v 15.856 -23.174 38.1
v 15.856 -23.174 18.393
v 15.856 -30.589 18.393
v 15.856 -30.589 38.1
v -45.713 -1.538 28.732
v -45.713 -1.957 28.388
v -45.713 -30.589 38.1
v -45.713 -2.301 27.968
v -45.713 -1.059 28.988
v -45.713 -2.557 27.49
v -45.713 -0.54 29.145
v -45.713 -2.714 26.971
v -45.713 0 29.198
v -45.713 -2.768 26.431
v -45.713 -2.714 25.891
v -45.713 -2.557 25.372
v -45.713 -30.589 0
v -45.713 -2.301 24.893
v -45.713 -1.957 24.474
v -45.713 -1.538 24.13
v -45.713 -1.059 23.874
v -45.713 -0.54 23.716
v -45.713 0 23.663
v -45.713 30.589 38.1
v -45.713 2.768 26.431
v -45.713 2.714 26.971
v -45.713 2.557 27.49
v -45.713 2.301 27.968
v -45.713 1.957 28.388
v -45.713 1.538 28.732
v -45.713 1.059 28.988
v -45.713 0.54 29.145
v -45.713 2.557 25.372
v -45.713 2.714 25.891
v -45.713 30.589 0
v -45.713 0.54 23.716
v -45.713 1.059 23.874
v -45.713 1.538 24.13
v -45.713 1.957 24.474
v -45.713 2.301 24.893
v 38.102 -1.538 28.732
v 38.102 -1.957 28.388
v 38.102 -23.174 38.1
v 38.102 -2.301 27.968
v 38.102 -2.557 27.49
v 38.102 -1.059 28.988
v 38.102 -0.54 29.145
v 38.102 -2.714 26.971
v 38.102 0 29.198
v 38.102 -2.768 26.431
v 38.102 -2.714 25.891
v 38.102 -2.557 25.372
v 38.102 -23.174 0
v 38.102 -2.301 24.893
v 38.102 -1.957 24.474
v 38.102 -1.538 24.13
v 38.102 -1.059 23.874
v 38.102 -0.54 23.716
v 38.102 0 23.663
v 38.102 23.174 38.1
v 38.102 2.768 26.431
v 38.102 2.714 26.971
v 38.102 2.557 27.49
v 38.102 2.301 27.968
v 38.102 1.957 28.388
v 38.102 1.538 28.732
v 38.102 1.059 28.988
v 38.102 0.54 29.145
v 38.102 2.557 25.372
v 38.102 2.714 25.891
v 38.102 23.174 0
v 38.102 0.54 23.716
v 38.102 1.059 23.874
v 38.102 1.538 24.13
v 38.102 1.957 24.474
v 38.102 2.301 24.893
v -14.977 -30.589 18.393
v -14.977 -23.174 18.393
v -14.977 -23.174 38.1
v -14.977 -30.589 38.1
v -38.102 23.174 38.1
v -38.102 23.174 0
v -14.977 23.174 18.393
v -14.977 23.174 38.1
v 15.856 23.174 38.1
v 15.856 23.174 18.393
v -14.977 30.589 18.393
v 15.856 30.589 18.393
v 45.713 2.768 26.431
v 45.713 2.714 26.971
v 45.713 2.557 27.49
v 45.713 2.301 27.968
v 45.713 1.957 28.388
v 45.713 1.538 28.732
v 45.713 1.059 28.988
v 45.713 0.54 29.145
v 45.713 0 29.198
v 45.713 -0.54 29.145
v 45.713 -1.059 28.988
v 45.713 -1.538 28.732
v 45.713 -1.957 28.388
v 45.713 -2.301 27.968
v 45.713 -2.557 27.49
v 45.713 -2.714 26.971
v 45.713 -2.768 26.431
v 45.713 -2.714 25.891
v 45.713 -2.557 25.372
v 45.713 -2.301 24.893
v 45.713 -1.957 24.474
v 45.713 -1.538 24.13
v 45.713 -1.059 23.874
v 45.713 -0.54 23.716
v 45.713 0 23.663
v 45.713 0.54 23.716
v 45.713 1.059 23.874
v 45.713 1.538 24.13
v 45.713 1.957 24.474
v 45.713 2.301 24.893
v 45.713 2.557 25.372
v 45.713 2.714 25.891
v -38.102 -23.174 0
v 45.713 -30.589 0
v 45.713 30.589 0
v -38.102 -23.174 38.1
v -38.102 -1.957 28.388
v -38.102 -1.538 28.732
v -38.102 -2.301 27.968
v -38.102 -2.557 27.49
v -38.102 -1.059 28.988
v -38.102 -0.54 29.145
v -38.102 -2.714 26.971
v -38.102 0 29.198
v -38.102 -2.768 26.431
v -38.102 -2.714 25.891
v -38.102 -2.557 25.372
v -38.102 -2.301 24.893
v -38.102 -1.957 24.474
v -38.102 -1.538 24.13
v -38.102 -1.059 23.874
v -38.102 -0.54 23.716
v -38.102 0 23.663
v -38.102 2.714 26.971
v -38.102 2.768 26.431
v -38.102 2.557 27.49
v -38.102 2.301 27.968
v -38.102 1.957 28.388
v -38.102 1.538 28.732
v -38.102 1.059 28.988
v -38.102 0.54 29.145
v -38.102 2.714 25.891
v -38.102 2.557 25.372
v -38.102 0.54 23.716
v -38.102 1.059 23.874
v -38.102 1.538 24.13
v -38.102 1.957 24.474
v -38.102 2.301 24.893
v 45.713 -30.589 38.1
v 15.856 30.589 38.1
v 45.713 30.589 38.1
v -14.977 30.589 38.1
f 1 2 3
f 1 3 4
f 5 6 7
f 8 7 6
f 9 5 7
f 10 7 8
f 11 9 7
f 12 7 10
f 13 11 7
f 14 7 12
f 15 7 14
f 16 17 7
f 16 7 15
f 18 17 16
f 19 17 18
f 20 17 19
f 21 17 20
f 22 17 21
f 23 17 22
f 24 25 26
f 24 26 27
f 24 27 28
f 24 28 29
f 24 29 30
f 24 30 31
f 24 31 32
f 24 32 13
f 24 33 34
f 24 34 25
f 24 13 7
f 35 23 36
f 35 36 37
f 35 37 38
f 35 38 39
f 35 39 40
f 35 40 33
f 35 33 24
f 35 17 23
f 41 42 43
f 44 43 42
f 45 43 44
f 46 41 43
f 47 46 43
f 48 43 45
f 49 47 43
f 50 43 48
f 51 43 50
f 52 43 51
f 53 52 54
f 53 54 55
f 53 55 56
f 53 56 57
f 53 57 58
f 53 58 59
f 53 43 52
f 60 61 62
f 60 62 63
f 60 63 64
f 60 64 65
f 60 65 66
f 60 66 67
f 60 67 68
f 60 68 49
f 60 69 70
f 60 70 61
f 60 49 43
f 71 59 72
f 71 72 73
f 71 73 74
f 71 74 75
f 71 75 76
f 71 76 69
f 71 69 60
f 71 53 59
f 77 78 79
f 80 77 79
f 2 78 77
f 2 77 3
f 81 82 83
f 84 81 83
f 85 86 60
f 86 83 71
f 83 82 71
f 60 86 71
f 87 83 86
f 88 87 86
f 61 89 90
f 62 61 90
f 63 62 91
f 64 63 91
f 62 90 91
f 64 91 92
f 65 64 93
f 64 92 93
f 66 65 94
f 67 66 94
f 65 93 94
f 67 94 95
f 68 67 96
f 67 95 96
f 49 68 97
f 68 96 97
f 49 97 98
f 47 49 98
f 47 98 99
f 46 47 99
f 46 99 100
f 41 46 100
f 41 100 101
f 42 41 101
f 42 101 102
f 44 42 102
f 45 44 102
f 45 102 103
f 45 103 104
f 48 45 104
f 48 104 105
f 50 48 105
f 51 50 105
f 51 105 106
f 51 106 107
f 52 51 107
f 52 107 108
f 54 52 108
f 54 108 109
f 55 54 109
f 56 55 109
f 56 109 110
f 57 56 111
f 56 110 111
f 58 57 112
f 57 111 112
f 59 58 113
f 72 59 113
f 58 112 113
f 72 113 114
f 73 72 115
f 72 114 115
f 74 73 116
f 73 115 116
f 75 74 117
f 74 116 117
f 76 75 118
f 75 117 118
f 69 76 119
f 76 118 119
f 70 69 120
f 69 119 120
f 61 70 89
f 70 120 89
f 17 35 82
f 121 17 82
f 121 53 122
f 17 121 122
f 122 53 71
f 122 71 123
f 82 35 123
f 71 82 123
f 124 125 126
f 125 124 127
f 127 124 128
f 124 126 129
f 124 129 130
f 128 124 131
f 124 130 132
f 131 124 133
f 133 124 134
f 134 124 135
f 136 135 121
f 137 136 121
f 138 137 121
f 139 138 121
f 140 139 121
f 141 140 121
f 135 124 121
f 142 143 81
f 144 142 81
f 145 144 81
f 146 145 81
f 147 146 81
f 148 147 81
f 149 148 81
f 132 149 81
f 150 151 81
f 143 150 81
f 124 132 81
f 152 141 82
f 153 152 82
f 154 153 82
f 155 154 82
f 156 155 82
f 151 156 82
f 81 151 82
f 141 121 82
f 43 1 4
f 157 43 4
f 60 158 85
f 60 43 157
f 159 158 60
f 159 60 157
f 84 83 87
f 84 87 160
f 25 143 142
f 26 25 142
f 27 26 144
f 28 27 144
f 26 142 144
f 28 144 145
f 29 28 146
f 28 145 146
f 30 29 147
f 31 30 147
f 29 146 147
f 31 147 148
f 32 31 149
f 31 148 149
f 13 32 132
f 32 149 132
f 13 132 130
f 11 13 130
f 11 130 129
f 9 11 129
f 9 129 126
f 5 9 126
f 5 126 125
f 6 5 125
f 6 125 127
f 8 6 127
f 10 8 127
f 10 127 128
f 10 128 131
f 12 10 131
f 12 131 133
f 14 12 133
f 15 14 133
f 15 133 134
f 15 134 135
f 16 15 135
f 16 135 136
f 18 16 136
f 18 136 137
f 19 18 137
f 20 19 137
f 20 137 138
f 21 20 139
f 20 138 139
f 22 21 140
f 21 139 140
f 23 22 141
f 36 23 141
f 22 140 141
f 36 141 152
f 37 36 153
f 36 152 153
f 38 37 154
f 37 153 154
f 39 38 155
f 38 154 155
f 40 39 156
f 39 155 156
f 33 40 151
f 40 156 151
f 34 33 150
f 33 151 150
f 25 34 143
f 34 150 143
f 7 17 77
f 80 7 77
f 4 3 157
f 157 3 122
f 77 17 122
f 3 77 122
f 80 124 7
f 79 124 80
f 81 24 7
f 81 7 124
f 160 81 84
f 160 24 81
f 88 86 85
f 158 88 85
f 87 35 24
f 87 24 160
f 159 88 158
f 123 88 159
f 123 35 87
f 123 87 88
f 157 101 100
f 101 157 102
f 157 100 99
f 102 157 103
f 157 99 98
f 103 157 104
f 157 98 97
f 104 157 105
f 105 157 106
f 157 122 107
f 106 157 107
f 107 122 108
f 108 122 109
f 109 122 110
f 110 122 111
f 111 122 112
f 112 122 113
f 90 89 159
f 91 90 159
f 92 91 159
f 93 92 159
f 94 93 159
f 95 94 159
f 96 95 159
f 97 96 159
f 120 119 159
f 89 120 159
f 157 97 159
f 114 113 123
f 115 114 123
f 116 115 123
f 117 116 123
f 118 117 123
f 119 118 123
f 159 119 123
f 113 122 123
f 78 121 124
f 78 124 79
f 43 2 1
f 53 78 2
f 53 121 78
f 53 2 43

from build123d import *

# Parameters (mm, degrees)
F0_W     = 91.42606
F0_H     = 61.178378
F0_W_2   = 76.204642
F0_H_2   = 46.347256
F1_DEPTH = 38.1
F2_W     = 30.83312
F2_H     = 20.100074
F3_DEPTH = 62.738
F4_DEPTH = 41.91
F5_R     = 2.767674
F6_DEPTH = 103.632


with BuildPart() as f1:
    # F0 (on Top) → F1 (new body)
    with BuildSketch(Plane.XY):
        Rectangle(F0_W, F0_H)
        Rectangle(F0_W_2, F0_H_2, mode=Mode.SUBTRACT)
    extrude(amount=F1_DEPTH)

    # F2 (on Front) → F3 (cut)
    with BuildSketch(Plane.XZ):
        with Locations((0.439078, 28.442579)):
            Rectangle(F2_W, F2_H)
    extrude(amount=F3_DEPTH, mode=Mode.SUBTRACT)

    # F2 (on Front) → F4 (cut)
    with BuildSketch(Plane.XZ):
        with Locations((0.439078, 28.442579)):
            Rectangle(F2_W, F2_H)
    extrude(amount=-F4_DEPTH, mode=Mode.SUBTRACT)

    # F5 (on face) → F6 (cut)
    with BuildSketch(Plane.YZ.offset(45.71303)):
        with Locations((0, 26.430823)):
            Circle(F5_R)
    extrude(amount=-F6_DEPTH, mode=Mode.SUBTRACT)


solid = f1.part
